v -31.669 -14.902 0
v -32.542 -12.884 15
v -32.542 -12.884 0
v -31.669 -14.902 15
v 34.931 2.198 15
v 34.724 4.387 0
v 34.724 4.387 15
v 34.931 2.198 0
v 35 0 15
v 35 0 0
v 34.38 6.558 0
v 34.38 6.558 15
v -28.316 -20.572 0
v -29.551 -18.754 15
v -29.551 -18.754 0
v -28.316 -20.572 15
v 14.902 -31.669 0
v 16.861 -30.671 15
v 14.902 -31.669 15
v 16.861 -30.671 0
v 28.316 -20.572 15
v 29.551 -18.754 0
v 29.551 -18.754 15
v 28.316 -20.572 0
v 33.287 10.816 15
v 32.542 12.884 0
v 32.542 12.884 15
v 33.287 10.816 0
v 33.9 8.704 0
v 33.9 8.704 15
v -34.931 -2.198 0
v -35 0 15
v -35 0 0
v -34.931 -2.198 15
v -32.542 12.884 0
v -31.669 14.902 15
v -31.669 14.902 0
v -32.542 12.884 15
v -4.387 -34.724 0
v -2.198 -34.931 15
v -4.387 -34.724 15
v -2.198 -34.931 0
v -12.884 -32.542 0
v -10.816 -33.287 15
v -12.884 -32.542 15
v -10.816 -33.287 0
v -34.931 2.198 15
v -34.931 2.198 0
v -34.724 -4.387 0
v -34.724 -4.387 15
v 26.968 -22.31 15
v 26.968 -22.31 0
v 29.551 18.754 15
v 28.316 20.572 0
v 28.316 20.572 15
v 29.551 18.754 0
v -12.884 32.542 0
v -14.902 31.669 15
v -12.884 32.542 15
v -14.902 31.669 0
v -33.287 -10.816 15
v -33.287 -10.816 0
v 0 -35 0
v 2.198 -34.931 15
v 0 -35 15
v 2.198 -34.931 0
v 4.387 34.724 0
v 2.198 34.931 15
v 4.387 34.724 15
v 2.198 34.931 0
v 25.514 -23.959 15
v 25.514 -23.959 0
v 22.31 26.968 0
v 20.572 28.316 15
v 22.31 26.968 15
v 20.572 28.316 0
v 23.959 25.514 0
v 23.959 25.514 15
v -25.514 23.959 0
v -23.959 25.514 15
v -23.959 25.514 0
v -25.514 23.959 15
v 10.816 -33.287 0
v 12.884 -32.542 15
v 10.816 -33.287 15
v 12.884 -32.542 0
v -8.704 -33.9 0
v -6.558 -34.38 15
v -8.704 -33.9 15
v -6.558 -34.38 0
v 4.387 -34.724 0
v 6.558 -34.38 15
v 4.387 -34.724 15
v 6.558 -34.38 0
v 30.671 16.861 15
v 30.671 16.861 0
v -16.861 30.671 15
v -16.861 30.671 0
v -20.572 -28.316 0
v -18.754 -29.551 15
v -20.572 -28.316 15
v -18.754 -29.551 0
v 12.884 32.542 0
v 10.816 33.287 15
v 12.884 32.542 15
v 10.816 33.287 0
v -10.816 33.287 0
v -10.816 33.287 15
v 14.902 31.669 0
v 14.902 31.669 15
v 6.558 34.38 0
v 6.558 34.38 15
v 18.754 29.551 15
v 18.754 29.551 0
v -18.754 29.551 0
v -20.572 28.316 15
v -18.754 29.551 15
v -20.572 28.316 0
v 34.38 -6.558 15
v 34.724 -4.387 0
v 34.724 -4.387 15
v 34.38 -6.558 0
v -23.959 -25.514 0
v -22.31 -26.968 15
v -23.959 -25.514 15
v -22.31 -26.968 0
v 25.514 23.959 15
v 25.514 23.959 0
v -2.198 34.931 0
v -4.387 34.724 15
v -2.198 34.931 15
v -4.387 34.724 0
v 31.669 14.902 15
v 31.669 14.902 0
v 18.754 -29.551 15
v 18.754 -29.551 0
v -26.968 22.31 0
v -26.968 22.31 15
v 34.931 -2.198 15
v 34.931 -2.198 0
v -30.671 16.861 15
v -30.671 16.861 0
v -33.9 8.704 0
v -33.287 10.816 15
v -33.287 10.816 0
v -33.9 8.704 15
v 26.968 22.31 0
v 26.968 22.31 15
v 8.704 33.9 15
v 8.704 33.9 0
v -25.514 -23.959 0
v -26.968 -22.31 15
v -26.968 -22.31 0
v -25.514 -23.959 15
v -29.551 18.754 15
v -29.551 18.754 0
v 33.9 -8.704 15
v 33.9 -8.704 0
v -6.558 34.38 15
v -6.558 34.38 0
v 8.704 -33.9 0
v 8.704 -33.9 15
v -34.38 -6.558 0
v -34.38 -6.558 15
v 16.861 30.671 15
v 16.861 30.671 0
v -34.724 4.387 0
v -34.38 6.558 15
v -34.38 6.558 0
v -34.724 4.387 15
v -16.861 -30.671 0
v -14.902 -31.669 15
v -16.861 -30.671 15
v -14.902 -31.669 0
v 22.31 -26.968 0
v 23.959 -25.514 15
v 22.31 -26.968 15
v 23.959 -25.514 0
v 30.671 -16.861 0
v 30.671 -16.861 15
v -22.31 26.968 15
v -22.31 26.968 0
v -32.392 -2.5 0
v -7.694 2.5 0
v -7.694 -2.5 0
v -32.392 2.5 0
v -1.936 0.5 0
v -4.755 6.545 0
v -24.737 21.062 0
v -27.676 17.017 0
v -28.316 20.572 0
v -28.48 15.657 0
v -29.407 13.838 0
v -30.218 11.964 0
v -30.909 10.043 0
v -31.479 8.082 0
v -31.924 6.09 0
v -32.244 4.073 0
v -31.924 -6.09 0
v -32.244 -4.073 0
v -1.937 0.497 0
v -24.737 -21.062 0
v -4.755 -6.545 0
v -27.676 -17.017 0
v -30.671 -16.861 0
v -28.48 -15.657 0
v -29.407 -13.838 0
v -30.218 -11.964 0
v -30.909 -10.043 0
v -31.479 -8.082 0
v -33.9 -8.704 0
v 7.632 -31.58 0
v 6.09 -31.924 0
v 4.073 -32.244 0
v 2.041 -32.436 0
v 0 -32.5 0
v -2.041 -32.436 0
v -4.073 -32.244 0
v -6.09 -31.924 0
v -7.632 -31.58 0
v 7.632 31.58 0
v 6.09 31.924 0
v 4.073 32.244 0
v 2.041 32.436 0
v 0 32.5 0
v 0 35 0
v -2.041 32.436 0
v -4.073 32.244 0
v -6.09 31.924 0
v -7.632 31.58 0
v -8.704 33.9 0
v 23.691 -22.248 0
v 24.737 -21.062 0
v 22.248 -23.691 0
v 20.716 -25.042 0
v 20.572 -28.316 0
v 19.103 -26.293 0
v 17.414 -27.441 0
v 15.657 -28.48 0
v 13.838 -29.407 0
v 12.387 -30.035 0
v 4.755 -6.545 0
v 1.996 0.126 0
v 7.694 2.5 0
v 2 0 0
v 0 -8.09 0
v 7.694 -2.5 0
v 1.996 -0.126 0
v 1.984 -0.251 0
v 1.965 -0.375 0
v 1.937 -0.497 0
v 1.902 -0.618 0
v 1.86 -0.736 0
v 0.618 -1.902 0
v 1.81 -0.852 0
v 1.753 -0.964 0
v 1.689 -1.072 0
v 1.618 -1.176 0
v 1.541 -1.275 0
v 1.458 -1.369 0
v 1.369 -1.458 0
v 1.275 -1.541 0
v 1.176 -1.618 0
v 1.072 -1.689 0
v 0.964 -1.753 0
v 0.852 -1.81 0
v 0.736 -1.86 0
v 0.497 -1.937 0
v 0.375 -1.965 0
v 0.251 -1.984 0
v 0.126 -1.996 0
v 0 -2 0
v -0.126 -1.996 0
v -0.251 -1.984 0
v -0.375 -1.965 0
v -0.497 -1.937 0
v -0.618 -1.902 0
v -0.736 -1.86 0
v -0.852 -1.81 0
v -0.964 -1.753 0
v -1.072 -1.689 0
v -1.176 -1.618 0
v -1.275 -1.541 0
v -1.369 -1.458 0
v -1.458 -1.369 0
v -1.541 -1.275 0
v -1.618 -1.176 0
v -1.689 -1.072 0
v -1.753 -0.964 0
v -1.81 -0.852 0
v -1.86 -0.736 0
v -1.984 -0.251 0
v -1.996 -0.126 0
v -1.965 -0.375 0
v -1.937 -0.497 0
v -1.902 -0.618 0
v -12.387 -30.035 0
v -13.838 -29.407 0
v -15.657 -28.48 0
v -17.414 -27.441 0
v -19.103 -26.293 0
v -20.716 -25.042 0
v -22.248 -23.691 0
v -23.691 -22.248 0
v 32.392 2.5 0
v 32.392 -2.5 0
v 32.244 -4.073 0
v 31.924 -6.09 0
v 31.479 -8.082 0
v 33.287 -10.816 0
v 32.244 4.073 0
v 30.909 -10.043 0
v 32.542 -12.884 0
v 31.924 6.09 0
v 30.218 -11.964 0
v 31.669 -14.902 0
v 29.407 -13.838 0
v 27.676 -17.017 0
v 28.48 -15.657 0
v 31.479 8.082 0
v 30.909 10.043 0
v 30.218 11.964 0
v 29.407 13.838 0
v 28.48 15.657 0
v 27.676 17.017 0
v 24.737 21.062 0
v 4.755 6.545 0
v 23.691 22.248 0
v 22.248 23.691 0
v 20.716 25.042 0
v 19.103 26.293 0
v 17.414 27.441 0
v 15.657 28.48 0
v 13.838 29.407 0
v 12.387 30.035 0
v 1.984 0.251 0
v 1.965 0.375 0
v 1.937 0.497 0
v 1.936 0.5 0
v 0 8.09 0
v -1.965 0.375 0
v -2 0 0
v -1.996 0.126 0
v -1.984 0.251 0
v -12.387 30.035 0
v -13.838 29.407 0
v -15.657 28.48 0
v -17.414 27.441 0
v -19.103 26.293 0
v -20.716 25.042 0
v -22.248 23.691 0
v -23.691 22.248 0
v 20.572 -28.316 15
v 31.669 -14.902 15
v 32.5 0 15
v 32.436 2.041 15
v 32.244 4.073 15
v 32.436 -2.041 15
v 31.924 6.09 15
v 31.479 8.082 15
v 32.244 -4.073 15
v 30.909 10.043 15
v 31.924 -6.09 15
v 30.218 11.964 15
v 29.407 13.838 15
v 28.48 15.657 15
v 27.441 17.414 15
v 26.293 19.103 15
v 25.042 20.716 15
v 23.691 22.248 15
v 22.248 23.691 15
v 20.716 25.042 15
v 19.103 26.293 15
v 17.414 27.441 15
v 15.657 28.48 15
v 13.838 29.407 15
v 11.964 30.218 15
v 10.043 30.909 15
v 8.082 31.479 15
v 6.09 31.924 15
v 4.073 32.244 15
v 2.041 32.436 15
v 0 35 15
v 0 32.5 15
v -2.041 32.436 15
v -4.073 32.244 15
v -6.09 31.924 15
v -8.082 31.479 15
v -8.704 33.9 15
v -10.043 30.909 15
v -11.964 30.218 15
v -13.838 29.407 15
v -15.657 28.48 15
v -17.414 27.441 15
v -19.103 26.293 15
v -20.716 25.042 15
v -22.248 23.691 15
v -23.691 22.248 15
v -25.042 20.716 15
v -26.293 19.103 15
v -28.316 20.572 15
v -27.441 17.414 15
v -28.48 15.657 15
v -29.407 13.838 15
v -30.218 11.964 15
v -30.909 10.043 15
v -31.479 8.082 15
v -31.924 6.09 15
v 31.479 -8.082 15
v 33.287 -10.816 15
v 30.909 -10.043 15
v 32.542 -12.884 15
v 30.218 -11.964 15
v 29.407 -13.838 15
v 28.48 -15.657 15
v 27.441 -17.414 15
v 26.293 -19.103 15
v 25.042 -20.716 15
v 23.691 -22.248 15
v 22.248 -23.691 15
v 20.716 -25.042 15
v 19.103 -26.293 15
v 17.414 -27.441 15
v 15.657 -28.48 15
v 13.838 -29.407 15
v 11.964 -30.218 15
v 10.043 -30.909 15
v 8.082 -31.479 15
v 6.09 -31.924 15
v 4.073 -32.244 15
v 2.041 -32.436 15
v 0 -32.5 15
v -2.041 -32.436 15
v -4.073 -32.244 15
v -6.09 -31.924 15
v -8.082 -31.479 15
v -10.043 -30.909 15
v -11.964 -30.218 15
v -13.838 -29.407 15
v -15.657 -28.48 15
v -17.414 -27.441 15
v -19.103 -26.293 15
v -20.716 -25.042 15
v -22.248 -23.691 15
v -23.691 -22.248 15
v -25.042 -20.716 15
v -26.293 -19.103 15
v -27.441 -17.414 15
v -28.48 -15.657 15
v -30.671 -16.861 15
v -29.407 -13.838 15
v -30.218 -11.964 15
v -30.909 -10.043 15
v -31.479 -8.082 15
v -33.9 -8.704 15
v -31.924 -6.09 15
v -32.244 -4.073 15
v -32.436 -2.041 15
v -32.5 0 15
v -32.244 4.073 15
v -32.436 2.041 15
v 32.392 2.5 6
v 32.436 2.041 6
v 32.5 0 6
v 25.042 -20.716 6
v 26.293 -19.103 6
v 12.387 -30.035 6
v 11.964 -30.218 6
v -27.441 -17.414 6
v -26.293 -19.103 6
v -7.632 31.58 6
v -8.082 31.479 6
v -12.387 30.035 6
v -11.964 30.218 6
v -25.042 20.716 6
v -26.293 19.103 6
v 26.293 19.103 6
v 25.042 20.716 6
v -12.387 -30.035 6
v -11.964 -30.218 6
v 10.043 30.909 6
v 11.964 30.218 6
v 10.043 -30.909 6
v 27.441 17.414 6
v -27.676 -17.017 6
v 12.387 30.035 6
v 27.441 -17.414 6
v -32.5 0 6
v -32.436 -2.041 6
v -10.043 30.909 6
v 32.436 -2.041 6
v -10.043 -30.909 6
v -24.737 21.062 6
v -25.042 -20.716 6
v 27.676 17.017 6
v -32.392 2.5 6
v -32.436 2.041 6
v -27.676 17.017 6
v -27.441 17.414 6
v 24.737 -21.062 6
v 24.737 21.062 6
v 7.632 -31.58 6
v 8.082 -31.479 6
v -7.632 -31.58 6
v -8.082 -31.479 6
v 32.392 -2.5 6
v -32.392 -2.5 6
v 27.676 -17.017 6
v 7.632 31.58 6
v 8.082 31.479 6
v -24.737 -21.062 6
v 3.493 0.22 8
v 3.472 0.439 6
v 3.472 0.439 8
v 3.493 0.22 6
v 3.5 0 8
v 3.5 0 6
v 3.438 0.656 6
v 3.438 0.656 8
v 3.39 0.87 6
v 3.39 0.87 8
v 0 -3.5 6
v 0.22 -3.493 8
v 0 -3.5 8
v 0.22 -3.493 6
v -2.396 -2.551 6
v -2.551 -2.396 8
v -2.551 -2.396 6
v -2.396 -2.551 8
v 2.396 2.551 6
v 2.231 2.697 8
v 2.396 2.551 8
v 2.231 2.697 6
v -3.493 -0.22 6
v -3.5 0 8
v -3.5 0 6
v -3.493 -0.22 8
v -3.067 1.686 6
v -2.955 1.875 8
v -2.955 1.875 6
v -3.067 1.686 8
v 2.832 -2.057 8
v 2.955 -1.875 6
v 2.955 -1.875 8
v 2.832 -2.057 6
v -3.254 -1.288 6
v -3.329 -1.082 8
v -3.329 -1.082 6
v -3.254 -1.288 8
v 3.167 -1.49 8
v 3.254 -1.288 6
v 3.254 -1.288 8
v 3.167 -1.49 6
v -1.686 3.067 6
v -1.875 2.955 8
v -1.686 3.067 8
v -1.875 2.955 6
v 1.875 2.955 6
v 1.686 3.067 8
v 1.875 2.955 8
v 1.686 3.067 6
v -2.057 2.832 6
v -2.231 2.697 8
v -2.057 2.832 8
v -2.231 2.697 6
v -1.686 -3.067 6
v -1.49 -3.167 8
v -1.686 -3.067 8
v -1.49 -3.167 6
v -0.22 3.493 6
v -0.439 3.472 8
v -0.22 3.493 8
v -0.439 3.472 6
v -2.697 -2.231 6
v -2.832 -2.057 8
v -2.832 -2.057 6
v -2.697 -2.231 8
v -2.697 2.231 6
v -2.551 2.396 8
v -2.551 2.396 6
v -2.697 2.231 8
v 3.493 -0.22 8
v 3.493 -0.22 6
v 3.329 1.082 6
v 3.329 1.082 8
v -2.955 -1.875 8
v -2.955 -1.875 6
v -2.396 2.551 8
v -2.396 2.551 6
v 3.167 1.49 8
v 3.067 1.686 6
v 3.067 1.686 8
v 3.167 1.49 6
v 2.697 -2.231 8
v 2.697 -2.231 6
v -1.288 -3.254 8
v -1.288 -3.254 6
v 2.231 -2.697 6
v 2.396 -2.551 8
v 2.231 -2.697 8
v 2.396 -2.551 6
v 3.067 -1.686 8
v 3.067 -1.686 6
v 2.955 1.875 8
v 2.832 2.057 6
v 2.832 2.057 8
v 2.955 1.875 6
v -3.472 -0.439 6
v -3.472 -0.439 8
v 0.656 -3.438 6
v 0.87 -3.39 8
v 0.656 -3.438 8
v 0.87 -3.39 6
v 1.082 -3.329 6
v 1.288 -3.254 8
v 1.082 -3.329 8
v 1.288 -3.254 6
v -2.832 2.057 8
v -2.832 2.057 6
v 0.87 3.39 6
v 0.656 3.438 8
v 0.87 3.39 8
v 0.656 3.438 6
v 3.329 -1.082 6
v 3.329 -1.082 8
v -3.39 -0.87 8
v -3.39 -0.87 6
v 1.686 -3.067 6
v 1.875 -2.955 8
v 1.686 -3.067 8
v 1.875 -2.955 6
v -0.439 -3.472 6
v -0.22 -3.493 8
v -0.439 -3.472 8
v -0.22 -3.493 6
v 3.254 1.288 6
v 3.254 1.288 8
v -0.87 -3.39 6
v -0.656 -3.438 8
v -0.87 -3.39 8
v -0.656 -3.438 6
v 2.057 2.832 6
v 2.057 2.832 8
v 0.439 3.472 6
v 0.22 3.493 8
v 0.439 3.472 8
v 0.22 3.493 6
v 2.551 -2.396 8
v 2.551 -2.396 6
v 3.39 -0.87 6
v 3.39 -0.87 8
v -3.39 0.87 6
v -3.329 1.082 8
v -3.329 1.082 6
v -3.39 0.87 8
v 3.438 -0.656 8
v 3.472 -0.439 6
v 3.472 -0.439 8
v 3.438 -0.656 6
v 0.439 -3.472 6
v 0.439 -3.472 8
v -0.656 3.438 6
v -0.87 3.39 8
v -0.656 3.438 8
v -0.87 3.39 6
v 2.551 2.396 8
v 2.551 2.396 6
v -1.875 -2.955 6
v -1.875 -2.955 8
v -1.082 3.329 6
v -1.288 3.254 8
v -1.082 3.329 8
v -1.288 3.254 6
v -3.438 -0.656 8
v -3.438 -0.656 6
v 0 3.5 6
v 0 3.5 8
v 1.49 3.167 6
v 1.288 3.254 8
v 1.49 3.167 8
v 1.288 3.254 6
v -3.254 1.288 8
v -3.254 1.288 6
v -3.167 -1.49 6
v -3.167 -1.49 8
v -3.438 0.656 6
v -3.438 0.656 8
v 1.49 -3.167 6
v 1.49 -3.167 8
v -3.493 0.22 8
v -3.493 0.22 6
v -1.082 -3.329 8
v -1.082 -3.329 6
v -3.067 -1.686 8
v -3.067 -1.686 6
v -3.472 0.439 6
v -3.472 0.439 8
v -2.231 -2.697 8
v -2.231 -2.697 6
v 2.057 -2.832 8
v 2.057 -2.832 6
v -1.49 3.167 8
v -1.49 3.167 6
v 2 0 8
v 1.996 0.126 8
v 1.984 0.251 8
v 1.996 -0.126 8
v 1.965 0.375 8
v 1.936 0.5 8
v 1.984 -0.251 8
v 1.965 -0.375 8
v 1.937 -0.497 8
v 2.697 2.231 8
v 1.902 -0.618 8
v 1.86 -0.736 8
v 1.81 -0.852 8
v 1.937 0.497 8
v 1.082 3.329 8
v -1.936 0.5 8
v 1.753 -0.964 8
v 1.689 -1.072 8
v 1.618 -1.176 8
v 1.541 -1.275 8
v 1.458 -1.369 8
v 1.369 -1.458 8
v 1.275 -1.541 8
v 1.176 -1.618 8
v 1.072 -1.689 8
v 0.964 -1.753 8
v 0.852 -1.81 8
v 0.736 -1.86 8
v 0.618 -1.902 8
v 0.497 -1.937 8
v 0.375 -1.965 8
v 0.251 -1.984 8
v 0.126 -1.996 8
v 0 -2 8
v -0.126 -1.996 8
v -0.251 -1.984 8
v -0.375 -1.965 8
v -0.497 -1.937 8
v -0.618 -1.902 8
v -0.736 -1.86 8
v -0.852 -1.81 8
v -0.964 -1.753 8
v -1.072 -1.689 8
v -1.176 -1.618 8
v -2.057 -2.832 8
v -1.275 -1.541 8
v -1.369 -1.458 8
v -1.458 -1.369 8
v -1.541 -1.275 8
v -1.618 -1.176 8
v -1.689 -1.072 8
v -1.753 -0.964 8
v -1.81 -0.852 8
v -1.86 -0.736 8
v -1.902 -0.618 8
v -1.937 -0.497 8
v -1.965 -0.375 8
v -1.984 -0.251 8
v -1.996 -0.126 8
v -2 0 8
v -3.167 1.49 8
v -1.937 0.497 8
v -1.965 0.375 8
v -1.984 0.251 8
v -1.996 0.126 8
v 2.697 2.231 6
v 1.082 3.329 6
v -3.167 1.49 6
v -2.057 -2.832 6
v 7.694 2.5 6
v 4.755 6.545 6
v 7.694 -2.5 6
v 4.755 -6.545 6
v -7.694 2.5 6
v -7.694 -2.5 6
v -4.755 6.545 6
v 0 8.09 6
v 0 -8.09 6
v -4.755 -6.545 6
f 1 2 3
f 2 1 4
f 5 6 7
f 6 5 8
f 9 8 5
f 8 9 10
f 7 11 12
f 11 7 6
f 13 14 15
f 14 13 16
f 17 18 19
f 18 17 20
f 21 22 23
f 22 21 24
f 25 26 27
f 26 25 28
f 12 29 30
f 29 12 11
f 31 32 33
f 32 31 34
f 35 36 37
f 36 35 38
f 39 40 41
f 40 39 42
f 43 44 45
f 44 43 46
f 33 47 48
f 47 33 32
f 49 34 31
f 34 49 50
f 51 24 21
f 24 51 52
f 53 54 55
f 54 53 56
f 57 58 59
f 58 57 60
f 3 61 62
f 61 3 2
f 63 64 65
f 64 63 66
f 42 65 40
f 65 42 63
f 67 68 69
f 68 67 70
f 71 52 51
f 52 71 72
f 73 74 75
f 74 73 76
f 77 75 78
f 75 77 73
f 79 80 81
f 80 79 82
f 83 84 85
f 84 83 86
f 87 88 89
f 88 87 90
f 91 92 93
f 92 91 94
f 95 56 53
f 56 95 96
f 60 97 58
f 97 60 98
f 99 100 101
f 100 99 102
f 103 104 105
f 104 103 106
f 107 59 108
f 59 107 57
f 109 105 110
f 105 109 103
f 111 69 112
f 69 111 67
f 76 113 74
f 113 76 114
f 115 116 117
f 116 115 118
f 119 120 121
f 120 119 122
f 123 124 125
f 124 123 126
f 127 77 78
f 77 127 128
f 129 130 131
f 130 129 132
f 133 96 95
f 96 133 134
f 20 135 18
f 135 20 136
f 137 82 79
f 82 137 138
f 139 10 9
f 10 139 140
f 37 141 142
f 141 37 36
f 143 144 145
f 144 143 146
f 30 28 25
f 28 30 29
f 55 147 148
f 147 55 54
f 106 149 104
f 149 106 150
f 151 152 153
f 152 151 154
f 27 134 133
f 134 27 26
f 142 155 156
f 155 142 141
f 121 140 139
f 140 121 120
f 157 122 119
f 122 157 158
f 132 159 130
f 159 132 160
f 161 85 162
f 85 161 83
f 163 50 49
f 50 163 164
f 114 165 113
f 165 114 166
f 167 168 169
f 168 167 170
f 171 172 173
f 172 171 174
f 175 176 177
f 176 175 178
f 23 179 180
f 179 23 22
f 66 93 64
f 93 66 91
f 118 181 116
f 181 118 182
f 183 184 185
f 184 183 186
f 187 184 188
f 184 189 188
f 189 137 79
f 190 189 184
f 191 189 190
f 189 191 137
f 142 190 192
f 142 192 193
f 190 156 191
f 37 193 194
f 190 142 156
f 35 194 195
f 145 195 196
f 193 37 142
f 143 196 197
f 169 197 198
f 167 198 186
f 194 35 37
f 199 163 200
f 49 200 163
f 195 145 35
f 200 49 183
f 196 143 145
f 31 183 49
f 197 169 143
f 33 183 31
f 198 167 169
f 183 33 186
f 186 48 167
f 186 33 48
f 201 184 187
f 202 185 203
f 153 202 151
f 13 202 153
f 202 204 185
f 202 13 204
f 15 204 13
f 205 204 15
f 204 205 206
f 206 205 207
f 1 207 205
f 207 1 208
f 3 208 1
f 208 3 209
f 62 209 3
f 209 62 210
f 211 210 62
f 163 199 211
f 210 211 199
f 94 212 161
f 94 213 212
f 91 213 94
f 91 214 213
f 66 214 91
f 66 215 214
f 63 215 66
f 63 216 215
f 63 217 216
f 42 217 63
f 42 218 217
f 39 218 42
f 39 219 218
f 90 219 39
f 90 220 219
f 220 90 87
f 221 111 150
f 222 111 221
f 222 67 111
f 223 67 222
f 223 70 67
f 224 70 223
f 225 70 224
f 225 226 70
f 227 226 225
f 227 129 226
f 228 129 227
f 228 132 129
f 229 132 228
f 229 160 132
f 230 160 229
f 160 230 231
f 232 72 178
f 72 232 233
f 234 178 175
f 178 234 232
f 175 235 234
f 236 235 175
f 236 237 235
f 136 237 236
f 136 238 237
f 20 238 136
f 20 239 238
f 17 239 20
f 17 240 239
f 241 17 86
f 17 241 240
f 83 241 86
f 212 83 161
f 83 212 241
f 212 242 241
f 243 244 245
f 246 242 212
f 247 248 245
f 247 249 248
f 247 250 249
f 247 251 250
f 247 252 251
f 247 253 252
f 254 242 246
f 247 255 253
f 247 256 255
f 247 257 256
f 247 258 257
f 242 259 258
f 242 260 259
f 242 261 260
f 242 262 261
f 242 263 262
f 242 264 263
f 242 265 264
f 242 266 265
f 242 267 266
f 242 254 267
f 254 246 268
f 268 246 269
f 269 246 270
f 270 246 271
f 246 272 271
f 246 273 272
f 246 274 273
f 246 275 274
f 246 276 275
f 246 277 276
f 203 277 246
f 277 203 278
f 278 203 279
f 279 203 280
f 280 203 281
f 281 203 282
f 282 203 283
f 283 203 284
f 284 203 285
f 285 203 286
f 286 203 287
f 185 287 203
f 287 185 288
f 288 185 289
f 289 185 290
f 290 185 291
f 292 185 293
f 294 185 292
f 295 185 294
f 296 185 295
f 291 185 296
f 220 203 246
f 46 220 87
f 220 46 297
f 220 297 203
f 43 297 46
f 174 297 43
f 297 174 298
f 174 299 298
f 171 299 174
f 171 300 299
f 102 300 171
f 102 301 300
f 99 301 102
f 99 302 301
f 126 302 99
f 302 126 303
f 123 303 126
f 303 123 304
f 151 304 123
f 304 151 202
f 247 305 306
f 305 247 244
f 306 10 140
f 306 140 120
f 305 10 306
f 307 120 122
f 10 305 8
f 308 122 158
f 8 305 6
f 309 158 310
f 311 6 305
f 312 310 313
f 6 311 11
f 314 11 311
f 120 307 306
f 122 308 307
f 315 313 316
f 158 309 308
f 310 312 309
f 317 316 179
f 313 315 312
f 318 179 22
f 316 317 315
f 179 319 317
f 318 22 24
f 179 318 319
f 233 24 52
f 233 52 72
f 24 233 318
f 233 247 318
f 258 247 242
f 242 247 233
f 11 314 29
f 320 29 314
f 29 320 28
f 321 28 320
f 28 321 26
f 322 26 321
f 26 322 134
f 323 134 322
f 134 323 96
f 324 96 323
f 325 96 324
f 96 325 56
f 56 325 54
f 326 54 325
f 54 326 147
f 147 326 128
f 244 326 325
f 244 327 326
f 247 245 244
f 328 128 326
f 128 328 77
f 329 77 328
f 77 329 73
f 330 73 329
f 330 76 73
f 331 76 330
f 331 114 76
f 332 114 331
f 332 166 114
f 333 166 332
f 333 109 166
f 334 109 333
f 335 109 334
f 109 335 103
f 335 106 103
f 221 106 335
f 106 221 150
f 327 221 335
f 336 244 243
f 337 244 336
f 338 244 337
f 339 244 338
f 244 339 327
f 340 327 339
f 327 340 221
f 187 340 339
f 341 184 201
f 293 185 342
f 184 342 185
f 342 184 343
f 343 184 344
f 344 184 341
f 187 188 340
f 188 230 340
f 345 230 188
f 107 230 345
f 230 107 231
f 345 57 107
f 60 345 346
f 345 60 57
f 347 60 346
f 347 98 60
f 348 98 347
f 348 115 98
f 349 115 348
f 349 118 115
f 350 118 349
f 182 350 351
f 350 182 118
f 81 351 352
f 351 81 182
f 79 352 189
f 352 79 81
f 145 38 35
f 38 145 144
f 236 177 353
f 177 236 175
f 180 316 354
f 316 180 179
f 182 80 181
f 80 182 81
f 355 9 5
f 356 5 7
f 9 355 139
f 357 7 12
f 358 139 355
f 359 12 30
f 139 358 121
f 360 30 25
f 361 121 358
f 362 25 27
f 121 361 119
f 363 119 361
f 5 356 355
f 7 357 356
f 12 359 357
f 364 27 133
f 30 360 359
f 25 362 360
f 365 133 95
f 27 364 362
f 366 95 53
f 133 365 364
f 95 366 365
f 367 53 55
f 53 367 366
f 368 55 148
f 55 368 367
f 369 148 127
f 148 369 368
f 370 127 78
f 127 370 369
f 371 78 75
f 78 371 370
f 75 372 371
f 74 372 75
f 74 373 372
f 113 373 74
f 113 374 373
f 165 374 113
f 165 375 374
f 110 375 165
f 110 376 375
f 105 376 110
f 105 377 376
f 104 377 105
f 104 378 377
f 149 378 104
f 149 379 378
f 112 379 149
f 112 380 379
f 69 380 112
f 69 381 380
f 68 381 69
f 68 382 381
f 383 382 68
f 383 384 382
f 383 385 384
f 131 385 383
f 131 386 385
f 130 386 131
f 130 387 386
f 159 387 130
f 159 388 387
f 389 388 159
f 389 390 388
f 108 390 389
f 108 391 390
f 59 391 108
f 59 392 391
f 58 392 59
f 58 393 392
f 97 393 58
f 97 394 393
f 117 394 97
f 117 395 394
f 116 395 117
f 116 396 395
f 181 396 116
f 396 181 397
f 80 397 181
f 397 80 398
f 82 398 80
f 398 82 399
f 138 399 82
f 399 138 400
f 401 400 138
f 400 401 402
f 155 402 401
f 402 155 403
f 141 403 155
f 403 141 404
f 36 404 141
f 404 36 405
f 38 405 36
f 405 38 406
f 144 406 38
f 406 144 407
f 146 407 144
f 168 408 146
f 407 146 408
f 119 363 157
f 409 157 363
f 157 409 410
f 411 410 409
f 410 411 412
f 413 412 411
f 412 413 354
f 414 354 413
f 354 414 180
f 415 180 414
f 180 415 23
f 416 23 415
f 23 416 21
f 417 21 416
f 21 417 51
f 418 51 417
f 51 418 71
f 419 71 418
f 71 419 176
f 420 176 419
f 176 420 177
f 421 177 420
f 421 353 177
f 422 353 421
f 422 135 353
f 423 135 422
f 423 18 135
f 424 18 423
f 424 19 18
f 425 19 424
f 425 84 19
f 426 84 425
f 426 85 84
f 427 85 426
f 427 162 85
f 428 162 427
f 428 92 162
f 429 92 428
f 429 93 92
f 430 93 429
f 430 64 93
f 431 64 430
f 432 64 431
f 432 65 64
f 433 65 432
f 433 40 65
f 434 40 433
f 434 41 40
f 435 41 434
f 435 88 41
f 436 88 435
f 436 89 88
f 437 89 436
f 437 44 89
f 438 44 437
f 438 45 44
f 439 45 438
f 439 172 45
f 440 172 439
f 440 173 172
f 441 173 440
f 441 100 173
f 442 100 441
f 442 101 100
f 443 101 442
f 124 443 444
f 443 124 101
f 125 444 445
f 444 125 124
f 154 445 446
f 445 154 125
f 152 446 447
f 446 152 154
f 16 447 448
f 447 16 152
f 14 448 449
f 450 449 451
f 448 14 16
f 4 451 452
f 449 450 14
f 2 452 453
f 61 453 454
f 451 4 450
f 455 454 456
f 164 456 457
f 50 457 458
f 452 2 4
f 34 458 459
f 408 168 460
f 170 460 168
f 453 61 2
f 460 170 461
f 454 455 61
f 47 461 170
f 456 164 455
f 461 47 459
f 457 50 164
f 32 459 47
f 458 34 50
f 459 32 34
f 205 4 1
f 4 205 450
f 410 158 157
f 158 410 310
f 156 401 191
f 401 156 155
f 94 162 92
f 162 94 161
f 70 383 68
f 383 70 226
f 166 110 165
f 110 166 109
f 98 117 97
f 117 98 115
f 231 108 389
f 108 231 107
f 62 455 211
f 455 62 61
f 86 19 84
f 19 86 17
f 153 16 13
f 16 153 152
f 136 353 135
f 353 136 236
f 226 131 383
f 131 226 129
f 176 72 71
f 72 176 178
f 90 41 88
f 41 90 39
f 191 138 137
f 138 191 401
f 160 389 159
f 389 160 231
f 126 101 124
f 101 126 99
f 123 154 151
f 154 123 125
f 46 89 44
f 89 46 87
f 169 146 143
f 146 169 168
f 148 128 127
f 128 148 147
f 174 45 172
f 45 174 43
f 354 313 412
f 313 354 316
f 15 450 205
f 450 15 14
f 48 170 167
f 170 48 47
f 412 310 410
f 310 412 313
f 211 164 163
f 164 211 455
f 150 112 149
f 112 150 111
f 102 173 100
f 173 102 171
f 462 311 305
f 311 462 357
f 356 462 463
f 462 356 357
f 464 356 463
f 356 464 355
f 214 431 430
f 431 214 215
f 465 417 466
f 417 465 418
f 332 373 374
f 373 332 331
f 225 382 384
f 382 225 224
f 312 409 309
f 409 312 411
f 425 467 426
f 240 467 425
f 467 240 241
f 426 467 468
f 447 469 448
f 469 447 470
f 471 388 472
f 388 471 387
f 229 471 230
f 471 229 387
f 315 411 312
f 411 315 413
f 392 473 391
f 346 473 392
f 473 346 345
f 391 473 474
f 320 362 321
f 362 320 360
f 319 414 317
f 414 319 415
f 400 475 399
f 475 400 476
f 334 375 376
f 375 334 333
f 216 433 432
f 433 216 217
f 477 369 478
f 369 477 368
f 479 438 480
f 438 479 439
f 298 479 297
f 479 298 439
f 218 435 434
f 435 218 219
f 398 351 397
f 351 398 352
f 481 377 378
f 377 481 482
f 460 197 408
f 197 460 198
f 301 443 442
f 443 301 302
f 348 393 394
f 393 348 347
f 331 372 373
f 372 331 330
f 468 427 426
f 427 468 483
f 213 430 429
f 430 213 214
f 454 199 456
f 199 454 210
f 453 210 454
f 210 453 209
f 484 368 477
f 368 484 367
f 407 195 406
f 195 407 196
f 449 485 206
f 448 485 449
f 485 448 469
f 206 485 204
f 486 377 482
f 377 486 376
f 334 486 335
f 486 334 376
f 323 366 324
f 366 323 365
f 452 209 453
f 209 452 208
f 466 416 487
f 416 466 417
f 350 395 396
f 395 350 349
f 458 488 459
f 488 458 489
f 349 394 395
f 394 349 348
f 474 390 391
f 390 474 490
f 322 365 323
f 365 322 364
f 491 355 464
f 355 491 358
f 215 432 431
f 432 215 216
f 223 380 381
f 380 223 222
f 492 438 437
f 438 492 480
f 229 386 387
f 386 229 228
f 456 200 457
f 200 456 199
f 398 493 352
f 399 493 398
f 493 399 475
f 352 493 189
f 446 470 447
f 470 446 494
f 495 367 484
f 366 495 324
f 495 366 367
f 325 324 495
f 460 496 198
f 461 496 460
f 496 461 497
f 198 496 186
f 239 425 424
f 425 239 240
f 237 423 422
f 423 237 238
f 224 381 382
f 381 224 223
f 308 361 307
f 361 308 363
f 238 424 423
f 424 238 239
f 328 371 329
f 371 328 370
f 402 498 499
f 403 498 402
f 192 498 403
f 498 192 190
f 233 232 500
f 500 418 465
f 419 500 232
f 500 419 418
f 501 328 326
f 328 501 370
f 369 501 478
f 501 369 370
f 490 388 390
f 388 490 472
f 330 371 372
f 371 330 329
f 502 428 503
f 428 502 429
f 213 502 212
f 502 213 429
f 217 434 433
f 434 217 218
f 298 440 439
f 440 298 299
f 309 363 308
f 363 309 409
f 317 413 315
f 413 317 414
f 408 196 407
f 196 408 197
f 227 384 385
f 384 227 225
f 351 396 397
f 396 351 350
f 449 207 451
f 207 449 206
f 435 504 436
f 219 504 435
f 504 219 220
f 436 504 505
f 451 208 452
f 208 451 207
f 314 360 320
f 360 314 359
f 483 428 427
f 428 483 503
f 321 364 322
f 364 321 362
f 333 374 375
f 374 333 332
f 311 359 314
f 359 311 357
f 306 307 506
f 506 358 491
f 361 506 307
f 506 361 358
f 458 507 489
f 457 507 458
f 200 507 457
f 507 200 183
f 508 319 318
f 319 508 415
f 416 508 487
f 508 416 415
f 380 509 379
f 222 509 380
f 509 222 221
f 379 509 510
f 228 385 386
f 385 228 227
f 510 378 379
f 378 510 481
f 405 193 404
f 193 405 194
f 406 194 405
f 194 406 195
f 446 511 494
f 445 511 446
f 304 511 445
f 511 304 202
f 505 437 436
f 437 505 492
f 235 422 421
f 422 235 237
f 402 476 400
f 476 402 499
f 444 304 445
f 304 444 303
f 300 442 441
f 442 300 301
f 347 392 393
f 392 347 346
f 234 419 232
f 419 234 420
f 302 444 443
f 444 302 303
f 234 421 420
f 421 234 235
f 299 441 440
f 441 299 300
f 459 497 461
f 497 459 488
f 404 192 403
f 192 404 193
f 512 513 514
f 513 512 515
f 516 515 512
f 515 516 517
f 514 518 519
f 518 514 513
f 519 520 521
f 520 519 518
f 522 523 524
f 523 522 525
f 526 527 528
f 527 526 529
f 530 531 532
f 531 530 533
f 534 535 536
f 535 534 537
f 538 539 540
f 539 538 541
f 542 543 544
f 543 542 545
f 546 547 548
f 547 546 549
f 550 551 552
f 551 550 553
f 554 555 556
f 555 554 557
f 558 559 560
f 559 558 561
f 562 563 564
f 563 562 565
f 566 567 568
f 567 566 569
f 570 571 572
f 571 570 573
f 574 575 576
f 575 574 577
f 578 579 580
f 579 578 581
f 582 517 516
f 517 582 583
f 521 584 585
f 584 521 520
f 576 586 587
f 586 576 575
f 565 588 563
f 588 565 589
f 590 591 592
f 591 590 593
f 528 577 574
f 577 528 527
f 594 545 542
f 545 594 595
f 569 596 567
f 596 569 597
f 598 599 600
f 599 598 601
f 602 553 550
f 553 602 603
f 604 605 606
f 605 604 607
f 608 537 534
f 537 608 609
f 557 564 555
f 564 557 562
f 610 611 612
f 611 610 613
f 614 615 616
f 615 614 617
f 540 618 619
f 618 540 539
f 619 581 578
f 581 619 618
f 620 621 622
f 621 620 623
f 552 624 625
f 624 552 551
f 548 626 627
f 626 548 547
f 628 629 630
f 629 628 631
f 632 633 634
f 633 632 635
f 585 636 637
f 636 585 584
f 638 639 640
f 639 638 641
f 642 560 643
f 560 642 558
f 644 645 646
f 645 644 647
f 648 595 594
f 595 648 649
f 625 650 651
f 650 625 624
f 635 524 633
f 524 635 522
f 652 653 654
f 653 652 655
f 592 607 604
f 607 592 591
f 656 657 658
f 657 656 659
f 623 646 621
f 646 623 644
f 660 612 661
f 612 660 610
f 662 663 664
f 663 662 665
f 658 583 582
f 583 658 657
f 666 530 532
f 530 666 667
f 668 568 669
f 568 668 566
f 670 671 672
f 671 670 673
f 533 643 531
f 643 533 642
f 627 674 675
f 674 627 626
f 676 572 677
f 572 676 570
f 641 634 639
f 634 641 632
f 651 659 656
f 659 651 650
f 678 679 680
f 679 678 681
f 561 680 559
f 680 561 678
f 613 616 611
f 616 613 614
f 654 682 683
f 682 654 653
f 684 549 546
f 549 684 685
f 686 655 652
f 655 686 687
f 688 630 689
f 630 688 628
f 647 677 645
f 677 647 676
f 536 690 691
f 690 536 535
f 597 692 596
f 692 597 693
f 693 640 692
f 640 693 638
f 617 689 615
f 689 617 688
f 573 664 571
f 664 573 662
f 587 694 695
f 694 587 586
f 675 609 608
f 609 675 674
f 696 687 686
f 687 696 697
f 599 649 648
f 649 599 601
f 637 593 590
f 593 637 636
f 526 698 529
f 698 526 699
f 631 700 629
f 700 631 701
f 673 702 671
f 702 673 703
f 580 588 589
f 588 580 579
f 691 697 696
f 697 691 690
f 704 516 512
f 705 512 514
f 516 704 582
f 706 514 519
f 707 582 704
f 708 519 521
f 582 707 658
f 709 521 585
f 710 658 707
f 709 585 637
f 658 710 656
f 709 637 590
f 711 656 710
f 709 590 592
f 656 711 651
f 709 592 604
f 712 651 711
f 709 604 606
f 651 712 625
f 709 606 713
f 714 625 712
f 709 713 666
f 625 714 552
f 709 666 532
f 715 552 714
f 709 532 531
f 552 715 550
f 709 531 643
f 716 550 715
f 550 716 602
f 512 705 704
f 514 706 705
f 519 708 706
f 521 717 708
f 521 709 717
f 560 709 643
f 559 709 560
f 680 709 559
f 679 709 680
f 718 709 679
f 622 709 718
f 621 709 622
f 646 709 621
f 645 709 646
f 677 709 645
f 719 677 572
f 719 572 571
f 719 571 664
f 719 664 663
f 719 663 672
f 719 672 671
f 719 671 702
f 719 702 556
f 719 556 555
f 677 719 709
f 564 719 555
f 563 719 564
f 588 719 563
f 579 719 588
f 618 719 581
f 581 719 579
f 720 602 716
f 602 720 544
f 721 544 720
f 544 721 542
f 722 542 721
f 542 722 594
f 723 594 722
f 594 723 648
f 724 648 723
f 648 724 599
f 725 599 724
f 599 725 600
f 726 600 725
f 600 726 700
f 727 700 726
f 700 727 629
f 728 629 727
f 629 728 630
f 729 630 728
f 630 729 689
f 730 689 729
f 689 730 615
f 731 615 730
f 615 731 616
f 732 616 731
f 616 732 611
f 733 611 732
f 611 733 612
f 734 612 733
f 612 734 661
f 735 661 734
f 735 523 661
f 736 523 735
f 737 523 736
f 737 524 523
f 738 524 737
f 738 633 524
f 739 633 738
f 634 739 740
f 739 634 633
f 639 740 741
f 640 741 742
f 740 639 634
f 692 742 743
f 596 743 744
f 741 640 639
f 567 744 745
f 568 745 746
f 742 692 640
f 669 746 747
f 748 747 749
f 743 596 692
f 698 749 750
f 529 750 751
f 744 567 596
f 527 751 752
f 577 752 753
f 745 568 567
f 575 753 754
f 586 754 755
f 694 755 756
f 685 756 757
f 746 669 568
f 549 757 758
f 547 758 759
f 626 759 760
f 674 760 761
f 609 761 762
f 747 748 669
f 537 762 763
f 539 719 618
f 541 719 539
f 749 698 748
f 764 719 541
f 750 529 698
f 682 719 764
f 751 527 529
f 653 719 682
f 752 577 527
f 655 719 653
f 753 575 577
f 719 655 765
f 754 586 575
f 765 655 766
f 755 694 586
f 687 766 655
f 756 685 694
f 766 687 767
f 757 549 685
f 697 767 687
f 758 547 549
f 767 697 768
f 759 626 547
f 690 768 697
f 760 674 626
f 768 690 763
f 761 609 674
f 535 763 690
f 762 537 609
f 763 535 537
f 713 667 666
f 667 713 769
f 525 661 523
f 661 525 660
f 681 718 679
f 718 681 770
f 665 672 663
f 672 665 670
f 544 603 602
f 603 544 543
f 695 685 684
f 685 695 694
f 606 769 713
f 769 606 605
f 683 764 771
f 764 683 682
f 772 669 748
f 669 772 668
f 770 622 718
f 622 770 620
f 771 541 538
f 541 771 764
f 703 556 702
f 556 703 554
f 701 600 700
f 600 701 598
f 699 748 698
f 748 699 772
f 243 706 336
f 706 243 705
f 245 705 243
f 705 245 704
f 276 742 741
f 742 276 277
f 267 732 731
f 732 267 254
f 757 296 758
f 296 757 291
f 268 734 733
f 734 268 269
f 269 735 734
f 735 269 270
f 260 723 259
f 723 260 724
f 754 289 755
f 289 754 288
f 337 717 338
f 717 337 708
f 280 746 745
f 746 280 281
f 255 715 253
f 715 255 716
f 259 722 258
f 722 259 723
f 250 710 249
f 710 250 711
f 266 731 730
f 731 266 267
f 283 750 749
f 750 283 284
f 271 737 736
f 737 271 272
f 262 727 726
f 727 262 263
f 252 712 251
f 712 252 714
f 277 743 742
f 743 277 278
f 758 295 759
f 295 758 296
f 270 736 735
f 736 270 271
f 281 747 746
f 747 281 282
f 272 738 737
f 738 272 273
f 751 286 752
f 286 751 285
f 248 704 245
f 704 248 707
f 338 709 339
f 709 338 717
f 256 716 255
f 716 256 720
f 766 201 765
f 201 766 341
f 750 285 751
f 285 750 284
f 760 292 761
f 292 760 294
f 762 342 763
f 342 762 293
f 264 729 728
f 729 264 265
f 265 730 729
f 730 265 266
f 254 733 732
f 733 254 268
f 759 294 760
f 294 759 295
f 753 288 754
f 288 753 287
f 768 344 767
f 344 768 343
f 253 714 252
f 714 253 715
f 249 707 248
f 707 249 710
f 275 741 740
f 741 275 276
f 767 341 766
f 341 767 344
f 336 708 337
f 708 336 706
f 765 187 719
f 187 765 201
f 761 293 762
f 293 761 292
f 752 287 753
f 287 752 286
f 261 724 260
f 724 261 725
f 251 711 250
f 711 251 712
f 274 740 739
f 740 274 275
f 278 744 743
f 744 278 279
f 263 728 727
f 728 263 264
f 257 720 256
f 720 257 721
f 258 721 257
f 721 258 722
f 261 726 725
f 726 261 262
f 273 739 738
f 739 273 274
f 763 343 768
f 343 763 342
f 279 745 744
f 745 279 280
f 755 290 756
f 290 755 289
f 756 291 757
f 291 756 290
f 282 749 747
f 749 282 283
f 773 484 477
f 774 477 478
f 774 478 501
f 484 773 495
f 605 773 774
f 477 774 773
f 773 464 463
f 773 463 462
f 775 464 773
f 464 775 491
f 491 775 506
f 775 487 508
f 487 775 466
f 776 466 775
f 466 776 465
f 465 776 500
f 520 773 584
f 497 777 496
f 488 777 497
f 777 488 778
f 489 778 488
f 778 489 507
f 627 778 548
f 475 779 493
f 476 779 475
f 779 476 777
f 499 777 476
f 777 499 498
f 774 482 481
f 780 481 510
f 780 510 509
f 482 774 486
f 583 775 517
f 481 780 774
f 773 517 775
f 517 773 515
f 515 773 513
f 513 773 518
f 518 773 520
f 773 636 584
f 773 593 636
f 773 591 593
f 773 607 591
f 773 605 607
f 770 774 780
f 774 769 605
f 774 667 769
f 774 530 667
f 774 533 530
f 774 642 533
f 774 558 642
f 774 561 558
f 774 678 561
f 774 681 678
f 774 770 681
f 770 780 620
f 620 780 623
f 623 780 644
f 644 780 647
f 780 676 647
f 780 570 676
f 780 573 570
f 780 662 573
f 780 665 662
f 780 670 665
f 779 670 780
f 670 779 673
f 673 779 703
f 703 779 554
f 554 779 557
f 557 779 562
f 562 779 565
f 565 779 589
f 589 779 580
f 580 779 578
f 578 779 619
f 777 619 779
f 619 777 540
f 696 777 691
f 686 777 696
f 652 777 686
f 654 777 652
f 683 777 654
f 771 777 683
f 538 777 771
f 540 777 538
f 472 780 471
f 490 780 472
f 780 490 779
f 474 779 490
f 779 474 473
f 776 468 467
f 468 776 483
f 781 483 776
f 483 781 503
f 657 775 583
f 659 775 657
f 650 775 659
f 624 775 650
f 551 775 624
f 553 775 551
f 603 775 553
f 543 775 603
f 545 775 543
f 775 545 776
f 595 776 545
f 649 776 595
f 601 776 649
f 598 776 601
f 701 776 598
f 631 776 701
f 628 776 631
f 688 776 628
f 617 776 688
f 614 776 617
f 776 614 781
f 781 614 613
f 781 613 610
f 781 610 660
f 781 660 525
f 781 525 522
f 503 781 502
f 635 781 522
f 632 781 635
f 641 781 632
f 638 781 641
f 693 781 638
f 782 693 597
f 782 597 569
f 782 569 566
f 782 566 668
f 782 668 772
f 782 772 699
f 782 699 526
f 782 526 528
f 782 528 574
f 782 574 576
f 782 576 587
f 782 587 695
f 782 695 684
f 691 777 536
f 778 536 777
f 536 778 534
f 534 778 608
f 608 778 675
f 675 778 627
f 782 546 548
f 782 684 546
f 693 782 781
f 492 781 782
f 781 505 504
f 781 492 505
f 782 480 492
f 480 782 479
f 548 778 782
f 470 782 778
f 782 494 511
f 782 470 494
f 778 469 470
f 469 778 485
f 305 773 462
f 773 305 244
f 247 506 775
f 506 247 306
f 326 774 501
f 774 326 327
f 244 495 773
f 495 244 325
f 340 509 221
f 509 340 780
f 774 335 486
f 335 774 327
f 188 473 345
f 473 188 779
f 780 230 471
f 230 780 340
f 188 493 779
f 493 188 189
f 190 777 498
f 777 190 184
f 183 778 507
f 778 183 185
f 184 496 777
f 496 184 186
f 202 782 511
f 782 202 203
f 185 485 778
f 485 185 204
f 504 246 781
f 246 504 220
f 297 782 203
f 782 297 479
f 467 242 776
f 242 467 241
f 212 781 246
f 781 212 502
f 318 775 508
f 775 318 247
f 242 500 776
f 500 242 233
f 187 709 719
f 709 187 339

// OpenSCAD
/*
 * Wheel Generator v1.0
 *
 * http://www.thingiverse.com/thing:1887576
 *
 * By: Maxstupo
 */

// (The outer diameter of the wheel):
outerDiameter = 70; 

// (The width of the wheel):
treadWidth = 15;

// (The thickness of the outer wheel ring):
treadThickness = 5; 

// (The axle diameter):
shaftDiameter = 4; 

// (The thickness of the hub):
hubThickness = 3; 

// (The width of the hub):
hubWidth = 8; 

// (If true use a keyed shaft hole):
useKey=true; // [true,false]

// (The offset of the key from the centre of the hole):
keyWidth = 0.5; 

// (Number of spokes):
spokeCount = 10;

// (The width of each spoke):
spokeWidth = 5; 

// (The height of each spoke in Z axis):
spokeThickness = 6;

/* [Misc] */
$fn = 100;


union(){
    hollowCylinder(outerDiameter,outerDiameter-treadThickness,treadWidth); // The "wheel"
 
    union(){
        hollowCylinder(shaftDiameter+hubThickness,shaftDiameter,hubWidth); // The wheel hub
        
        // Spokes
        difference(){
            union(){
                for (i = [0 : (360 / spokeCount) : 360]) {
                    rotate([0,0,i])translate([0,-spokeWidth/2,0]) cube([outerDiameter/2,spokeWidth,spokeThickness]);   
                }
            }
            translate([0,0,-1]) cylinder(h=spokeThickness+2,d=shaftDiameter);
            translate([0,0,-1]) hollowCylinder(outerDiameter+treadThickness,outerDiameter,spokeThickness+2);
        }
         
        // Make the shaft hole keyed
        if(useKey){
            difference(){
                translate([-shaftDiameter/2,keyWidth,0]) cube([shaftDiameter,shaftDiameter/2-keyWidth,hubWidth]);
                translate([0,0,-1]) hollowCylinder(outerDiameter-treadThickness,shaftDiameter+hubThickness,hubWidth+2);
            }
        }
    }
}

module hollowCylinder(od,id,h){
    difference(){
        cylinder(d=od,h=h);
        translate([0,0,-1]) cylinder(d=id,h=h+2);
    }
}
